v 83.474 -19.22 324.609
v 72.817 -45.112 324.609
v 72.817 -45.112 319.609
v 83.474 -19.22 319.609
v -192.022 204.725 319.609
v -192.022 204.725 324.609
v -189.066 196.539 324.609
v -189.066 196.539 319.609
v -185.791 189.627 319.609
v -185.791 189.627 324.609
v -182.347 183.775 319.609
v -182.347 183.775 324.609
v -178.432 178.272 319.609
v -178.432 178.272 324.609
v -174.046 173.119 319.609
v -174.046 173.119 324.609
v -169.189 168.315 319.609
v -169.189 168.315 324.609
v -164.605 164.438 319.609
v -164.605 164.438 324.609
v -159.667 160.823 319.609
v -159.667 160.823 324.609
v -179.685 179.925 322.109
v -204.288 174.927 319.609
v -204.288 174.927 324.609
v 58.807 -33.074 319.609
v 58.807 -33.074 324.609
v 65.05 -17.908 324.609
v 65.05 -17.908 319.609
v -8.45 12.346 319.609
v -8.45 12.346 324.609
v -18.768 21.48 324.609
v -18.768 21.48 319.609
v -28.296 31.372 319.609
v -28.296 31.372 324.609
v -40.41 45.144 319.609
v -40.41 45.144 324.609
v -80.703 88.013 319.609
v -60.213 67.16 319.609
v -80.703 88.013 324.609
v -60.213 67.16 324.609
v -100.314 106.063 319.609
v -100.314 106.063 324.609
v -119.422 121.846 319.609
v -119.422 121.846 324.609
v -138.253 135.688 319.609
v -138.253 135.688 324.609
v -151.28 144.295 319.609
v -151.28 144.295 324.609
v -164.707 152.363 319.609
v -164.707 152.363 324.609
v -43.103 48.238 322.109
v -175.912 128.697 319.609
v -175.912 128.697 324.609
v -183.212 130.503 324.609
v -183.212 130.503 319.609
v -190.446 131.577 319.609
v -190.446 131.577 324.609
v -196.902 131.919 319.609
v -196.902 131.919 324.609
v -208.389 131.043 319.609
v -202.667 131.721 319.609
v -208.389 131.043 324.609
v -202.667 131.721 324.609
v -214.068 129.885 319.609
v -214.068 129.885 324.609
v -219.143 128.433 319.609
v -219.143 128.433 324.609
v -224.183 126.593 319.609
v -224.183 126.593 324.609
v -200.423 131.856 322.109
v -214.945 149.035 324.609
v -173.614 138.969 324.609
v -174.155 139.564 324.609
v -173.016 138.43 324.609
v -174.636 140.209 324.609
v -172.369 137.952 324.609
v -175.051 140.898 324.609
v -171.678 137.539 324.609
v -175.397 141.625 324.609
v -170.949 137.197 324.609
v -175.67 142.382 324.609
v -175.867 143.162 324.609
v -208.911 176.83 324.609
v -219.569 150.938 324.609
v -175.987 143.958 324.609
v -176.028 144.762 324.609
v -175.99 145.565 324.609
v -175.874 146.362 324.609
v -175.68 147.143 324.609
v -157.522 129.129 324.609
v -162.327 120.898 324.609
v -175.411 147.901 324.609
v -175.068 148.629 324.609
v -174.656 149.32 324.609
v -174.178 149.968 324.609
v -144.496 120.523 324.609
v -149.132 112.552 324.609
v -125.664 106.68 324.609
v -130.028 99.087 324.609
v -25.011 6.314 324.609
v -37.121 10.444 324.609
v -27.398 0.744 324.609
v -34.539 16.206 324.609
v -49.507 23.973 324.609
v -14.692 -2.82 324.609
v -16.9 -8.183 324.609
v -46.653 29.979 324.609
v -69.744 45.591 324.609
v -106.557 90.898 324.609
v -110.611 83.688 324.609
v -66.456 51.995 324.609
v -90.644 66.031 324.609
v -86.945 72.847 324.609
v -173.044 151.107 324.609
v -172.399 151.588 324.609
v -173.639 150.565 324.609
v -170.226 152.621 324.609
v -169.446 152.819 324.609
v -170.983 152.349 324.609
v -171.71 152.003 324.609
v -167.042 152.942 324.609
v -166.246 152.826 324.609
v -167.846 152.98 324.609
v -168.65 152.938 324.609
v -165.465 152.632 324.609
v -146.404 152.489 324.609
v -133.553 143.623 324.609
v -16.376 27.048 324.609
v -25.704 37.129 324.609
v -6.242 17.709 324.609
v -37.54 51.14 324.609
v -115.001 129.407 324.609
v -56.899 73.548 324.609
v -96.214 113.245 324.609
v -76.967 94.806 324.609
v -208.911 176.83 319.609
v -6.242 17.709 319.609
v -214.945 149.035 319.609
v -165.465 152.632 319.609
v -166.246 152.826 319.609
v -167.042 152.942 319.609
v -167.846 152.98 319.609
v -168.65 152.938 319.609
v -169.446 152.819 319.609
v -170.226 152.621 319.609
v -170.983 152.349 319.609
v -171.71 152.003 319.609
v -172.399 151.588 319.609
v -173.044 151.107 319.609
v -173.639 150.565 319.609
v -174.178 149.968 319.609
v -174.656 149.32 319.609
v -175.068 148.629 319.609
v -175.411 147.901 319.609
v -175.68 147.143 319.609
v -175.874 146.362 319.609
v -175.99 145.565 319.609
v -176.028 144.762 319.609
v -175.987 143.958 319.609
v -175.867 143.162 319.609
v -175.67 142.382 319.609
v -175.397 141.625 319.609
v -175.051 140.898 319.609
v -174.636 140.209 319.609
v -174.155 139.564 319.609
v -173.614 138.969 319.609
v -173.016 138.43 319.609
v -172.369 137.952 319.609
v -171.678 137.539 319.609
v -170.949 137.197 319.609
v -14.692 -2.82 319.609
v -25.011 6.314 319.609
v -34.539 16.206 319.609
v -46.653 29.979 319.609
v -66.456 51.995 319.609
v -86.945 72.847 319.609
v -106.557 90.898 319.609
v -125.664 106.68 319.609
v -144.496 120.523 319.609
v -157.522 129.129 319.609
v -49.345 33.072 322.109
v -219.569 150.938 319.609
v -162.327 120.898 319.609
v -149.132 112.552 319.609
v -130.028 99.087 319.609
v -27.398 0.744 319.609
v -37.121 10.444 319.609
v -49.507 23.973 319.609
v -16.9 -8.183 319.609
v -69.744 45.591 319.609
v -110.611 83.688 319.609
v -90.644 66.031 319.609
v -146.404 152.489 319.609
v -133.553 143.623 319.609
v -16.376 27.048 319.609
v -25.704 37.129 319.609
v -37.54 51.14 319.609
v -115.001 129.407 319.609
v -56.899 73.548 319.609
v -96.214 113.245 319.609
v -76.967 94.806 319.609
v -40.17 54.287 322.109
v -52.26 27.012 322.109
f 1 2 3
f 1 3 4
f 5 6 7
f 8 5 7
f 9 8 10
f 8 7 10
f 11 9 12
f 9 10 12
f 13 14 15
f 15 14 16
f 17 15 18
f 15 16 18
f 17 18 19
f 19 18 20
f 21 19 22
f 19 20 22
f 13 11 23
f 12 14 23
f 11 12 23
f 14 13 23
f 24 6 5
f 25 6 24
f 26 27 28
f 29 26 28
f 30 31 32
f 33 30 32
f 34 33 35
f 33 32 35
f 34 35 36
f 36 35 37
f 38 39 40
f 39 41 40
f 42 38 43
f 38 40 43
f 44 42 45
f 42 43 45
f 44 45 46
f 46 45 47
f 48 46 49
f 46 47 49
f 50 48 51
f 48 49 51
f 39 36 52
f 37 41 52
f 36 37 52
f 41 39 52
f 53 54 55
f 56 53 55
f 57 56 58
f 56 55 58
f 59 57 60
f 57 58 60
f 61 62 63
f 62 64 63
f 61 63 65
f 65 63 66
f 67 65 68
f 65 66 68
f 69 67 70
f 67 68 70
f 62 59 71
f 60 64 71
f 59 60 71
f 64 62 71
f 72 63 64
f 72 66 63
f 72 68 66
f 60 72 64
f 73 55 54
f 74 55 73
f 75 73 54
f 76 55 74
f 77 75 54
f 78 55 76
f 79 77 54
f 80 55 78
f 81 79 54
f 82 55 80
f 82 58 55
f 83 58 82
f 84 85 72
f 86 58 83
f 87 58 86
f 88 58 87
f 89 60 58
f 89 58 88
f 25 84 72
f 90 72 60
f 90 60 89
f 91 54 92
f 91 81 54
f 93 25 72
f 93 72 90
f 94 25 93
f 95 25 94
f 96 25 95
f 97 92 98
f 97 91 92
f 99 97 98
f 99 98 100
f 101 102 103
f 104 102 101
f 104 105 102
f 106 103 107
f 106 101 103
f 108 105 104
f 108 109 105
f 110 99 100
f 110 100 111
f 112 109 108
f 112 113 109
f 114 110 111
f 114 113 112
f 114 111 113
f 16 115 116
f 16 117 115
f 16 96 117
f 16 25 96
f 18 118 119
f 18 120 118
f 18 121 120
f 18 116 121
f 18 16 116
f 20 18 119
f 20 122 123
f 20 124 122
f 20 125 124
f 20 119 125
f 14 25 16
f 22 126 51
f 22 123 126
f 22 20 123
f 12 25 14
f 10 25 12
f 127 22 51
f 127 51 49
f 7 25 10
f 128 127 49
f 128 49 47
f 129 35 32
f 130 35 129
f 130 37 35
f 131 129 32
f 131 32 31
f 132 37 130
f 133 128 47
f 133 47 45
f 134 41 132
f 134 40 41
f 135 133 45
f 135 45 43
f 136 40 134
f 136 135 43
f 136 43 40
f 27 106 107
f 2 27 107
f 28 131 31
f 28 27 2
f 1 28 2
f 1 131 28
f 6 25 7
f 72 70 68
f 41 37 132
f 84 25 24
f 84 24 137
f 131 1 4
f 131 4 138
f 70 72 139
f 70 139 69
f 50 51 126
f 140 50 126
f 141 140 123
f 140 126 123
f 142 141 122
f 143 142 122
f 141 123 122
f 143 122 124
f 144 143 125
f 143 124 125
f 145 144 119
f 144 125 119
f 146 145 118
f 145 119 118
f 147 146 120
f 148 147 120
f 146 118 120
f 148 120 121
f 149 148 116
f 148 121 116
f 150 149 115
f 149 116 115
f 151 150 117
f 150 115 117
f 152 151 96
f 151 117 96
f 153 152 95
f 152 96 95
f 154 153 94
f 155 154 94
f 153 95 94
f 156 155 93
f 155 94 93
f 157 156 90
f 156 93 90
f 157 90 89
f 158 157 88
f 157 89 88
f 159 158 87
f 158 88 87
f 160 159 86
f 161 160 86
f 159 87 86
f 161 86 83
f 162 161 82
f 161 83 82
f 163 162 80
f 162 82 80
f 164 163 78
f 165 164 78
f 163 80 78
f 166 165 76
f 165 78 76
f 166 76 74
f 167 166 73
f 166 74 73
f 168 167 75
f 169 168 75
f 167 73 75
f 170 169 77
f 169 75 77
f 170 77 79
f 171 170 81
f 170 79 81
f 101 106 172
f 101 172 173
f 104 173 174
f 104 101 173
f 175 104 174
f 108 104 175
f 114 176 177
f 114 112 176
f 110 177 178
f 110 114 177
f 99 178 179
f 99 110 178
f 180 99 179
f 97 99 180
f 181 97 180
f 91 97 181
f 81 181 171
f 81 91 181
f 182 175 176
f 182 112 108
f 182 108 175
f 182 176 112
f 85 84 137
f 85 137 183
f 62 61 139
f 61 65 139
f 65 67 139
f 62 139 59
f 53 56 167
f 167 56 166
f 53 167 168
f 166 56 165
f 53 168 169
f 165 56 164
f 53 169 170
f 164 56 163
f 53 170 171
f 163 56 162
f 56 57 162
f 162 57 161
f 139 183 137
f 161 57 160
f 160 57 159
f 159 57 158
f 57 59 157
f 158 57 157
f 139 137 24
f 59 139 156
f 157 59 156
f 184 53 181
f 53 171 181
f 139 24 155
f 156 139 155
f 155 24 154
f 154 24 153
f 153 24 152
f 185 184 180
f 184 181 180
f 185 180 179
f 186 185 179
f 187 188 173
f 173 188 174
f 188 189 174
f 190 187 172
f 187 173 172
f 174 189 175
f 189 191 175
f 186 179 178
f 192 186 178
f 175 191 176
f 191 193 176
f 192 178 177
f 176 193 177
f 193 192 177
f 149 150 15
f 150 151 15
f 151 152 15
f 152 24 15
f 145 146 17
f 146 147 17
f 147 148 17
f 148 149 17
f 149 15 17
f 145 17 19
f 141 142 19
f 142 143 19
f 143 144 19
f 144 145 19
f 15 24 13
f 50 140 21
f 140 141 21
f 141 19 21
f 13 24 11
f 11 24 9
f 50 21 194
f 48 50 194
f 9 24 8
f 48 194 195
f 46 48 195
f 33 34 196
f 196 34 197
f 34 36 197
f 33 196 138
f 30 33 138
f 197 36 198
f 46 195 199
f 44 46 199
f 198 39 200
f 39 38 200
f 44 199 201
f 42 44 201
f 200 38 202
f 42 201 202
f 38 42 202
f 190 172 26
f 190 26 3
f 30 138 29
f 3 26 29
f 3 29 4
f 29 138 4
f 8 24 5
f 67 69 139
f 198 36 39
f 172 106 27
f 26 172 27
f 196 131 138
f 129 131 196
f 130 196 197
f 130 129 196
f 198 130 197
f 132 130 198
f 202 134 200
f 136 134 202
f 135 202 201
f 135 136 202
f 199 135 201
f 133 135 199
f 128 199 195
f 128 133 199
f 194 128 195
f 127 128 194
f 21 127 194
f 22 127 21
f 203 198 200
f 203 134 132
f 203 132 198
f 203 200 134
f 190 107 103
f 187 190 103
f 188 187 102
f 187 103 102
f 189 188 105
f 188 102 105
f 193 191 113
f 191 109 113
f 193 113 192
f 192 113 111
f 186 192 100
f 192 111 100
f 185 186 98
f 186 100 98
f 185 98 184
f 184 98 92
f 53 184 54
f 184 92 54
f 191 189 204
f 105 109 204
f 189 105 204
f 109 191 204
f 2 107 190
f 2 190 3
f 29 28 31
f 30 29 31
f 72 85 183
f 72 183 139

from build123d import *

# Parameters (mm, degrees)
BOSS_EXTRUDE1_DEPTH = 5


with BuildPart() as part:
    # Sketch2 → Boss-Extrude1 (new body)
    with BuildSketch(Plane.XY.offset(324.609115736)):
        with BuildLine():
            Line((-16.90012844, -8.183190187), (72.816503584, -45.112441184))
            Line((72.816503584, -45.112441184), (83.47431689, -19.220144733))
            Line((83.47431689, -19.220144733), (-6.242315134, 17.709106264))
            add(Edge.make_bspline(
                [(-6.242315134, 17.709106264), (-19.147085678, 28.427579084), (-62.609683594, 83.624540664), (-113.341454038, 133.123455083), (-159.667254415, 160.823469136)],
                knots=[0, 0, 0, 0, 0.237148473, 1, 1, 1, 1], degree=3))
            add(Edge.make_bspline(
                [(-192.022205471, 204.724702407), (-183.525718419, 177.076811357), (-159.667254415, 160.823469136)],
                knots=[0, 0, 0, 1, 1, 1], degree=2))
            Line((-192.022205471, 204.724702407), (-204.287606756, 174.926900827))
            Line((-204.287606756, 174.926900827), (-208.911231122, 176.830081774))
            Line((-208.911231122, 176.830081774), (-219.569044429, 150.937785322))
            Line((-219.569044429, 150.937785322), (-214.945420062, 149.034604375))
            Line((-214.945420062, 149.034604375), (-224.18290752, 126.592874832))
            add(Edge.make_bspline(
                [(-175.911850273, 128.697068335), (-200.797987469, 136.066038881), (-224.18290752, 126.592874832)],
                knots=[0, 0, 0, 1, 1, 1], degree=2))
            add(Edge.make_bspline(
                [(-16.90012844, -8.183190187), (-30.222192507, 2.01197393), (-75.852029724, 55.431258283), (-128.517955825, 102.867060046), (-175.911850273, 128.697068335)],
                knots=[0, 0, 0, 0, 0.237148473, 1, 1, 1, 1], degree=3))
        make_face()
        with BuildLine():
            Line((65.049758472, -17.908345143), (-8.450005033, 12.345702))
            add(Edge.make_bspline(
                [(-8.450005033, 12.345702), (-21.566591824, 22.803900379), (-66.124581019, 77.120450197), (-117.836312175, 125.594689972), (-164.70691842, 152.362521961)],
                knots=[0, 0, 0, 0, 0.237148473, 1, 1, 1, 1], degree=3))
            ThreePointArc((-164.70691842, 152.362521961), (-175.410879134, 147.900994755), (-170.949351927, 137.19703404))
            add(Edge.make_bspline(
                [(-14.692438541, -2.819785922), (-27.809025332, 7.638412457), (-72.367014526, 61.954962275), (-124.078745683, 110.429202051), (-170.949351927, 137.19703404)],
                knots=[0, 0, 0, 0, 0.237148473, 1, 1, 1, 1], degree=3))
            Line((-14.692438541, -2.819785922), (58.807324964, -33.073833065))
            Line((58.807324964, -33.073833065), (65.049758472, -17.908345143))
        make_face(mode=Mode.SUBTRACT)
    extrude(amount=-BOSS_EXTRUDE1_DEPTH)


solid = part.part
